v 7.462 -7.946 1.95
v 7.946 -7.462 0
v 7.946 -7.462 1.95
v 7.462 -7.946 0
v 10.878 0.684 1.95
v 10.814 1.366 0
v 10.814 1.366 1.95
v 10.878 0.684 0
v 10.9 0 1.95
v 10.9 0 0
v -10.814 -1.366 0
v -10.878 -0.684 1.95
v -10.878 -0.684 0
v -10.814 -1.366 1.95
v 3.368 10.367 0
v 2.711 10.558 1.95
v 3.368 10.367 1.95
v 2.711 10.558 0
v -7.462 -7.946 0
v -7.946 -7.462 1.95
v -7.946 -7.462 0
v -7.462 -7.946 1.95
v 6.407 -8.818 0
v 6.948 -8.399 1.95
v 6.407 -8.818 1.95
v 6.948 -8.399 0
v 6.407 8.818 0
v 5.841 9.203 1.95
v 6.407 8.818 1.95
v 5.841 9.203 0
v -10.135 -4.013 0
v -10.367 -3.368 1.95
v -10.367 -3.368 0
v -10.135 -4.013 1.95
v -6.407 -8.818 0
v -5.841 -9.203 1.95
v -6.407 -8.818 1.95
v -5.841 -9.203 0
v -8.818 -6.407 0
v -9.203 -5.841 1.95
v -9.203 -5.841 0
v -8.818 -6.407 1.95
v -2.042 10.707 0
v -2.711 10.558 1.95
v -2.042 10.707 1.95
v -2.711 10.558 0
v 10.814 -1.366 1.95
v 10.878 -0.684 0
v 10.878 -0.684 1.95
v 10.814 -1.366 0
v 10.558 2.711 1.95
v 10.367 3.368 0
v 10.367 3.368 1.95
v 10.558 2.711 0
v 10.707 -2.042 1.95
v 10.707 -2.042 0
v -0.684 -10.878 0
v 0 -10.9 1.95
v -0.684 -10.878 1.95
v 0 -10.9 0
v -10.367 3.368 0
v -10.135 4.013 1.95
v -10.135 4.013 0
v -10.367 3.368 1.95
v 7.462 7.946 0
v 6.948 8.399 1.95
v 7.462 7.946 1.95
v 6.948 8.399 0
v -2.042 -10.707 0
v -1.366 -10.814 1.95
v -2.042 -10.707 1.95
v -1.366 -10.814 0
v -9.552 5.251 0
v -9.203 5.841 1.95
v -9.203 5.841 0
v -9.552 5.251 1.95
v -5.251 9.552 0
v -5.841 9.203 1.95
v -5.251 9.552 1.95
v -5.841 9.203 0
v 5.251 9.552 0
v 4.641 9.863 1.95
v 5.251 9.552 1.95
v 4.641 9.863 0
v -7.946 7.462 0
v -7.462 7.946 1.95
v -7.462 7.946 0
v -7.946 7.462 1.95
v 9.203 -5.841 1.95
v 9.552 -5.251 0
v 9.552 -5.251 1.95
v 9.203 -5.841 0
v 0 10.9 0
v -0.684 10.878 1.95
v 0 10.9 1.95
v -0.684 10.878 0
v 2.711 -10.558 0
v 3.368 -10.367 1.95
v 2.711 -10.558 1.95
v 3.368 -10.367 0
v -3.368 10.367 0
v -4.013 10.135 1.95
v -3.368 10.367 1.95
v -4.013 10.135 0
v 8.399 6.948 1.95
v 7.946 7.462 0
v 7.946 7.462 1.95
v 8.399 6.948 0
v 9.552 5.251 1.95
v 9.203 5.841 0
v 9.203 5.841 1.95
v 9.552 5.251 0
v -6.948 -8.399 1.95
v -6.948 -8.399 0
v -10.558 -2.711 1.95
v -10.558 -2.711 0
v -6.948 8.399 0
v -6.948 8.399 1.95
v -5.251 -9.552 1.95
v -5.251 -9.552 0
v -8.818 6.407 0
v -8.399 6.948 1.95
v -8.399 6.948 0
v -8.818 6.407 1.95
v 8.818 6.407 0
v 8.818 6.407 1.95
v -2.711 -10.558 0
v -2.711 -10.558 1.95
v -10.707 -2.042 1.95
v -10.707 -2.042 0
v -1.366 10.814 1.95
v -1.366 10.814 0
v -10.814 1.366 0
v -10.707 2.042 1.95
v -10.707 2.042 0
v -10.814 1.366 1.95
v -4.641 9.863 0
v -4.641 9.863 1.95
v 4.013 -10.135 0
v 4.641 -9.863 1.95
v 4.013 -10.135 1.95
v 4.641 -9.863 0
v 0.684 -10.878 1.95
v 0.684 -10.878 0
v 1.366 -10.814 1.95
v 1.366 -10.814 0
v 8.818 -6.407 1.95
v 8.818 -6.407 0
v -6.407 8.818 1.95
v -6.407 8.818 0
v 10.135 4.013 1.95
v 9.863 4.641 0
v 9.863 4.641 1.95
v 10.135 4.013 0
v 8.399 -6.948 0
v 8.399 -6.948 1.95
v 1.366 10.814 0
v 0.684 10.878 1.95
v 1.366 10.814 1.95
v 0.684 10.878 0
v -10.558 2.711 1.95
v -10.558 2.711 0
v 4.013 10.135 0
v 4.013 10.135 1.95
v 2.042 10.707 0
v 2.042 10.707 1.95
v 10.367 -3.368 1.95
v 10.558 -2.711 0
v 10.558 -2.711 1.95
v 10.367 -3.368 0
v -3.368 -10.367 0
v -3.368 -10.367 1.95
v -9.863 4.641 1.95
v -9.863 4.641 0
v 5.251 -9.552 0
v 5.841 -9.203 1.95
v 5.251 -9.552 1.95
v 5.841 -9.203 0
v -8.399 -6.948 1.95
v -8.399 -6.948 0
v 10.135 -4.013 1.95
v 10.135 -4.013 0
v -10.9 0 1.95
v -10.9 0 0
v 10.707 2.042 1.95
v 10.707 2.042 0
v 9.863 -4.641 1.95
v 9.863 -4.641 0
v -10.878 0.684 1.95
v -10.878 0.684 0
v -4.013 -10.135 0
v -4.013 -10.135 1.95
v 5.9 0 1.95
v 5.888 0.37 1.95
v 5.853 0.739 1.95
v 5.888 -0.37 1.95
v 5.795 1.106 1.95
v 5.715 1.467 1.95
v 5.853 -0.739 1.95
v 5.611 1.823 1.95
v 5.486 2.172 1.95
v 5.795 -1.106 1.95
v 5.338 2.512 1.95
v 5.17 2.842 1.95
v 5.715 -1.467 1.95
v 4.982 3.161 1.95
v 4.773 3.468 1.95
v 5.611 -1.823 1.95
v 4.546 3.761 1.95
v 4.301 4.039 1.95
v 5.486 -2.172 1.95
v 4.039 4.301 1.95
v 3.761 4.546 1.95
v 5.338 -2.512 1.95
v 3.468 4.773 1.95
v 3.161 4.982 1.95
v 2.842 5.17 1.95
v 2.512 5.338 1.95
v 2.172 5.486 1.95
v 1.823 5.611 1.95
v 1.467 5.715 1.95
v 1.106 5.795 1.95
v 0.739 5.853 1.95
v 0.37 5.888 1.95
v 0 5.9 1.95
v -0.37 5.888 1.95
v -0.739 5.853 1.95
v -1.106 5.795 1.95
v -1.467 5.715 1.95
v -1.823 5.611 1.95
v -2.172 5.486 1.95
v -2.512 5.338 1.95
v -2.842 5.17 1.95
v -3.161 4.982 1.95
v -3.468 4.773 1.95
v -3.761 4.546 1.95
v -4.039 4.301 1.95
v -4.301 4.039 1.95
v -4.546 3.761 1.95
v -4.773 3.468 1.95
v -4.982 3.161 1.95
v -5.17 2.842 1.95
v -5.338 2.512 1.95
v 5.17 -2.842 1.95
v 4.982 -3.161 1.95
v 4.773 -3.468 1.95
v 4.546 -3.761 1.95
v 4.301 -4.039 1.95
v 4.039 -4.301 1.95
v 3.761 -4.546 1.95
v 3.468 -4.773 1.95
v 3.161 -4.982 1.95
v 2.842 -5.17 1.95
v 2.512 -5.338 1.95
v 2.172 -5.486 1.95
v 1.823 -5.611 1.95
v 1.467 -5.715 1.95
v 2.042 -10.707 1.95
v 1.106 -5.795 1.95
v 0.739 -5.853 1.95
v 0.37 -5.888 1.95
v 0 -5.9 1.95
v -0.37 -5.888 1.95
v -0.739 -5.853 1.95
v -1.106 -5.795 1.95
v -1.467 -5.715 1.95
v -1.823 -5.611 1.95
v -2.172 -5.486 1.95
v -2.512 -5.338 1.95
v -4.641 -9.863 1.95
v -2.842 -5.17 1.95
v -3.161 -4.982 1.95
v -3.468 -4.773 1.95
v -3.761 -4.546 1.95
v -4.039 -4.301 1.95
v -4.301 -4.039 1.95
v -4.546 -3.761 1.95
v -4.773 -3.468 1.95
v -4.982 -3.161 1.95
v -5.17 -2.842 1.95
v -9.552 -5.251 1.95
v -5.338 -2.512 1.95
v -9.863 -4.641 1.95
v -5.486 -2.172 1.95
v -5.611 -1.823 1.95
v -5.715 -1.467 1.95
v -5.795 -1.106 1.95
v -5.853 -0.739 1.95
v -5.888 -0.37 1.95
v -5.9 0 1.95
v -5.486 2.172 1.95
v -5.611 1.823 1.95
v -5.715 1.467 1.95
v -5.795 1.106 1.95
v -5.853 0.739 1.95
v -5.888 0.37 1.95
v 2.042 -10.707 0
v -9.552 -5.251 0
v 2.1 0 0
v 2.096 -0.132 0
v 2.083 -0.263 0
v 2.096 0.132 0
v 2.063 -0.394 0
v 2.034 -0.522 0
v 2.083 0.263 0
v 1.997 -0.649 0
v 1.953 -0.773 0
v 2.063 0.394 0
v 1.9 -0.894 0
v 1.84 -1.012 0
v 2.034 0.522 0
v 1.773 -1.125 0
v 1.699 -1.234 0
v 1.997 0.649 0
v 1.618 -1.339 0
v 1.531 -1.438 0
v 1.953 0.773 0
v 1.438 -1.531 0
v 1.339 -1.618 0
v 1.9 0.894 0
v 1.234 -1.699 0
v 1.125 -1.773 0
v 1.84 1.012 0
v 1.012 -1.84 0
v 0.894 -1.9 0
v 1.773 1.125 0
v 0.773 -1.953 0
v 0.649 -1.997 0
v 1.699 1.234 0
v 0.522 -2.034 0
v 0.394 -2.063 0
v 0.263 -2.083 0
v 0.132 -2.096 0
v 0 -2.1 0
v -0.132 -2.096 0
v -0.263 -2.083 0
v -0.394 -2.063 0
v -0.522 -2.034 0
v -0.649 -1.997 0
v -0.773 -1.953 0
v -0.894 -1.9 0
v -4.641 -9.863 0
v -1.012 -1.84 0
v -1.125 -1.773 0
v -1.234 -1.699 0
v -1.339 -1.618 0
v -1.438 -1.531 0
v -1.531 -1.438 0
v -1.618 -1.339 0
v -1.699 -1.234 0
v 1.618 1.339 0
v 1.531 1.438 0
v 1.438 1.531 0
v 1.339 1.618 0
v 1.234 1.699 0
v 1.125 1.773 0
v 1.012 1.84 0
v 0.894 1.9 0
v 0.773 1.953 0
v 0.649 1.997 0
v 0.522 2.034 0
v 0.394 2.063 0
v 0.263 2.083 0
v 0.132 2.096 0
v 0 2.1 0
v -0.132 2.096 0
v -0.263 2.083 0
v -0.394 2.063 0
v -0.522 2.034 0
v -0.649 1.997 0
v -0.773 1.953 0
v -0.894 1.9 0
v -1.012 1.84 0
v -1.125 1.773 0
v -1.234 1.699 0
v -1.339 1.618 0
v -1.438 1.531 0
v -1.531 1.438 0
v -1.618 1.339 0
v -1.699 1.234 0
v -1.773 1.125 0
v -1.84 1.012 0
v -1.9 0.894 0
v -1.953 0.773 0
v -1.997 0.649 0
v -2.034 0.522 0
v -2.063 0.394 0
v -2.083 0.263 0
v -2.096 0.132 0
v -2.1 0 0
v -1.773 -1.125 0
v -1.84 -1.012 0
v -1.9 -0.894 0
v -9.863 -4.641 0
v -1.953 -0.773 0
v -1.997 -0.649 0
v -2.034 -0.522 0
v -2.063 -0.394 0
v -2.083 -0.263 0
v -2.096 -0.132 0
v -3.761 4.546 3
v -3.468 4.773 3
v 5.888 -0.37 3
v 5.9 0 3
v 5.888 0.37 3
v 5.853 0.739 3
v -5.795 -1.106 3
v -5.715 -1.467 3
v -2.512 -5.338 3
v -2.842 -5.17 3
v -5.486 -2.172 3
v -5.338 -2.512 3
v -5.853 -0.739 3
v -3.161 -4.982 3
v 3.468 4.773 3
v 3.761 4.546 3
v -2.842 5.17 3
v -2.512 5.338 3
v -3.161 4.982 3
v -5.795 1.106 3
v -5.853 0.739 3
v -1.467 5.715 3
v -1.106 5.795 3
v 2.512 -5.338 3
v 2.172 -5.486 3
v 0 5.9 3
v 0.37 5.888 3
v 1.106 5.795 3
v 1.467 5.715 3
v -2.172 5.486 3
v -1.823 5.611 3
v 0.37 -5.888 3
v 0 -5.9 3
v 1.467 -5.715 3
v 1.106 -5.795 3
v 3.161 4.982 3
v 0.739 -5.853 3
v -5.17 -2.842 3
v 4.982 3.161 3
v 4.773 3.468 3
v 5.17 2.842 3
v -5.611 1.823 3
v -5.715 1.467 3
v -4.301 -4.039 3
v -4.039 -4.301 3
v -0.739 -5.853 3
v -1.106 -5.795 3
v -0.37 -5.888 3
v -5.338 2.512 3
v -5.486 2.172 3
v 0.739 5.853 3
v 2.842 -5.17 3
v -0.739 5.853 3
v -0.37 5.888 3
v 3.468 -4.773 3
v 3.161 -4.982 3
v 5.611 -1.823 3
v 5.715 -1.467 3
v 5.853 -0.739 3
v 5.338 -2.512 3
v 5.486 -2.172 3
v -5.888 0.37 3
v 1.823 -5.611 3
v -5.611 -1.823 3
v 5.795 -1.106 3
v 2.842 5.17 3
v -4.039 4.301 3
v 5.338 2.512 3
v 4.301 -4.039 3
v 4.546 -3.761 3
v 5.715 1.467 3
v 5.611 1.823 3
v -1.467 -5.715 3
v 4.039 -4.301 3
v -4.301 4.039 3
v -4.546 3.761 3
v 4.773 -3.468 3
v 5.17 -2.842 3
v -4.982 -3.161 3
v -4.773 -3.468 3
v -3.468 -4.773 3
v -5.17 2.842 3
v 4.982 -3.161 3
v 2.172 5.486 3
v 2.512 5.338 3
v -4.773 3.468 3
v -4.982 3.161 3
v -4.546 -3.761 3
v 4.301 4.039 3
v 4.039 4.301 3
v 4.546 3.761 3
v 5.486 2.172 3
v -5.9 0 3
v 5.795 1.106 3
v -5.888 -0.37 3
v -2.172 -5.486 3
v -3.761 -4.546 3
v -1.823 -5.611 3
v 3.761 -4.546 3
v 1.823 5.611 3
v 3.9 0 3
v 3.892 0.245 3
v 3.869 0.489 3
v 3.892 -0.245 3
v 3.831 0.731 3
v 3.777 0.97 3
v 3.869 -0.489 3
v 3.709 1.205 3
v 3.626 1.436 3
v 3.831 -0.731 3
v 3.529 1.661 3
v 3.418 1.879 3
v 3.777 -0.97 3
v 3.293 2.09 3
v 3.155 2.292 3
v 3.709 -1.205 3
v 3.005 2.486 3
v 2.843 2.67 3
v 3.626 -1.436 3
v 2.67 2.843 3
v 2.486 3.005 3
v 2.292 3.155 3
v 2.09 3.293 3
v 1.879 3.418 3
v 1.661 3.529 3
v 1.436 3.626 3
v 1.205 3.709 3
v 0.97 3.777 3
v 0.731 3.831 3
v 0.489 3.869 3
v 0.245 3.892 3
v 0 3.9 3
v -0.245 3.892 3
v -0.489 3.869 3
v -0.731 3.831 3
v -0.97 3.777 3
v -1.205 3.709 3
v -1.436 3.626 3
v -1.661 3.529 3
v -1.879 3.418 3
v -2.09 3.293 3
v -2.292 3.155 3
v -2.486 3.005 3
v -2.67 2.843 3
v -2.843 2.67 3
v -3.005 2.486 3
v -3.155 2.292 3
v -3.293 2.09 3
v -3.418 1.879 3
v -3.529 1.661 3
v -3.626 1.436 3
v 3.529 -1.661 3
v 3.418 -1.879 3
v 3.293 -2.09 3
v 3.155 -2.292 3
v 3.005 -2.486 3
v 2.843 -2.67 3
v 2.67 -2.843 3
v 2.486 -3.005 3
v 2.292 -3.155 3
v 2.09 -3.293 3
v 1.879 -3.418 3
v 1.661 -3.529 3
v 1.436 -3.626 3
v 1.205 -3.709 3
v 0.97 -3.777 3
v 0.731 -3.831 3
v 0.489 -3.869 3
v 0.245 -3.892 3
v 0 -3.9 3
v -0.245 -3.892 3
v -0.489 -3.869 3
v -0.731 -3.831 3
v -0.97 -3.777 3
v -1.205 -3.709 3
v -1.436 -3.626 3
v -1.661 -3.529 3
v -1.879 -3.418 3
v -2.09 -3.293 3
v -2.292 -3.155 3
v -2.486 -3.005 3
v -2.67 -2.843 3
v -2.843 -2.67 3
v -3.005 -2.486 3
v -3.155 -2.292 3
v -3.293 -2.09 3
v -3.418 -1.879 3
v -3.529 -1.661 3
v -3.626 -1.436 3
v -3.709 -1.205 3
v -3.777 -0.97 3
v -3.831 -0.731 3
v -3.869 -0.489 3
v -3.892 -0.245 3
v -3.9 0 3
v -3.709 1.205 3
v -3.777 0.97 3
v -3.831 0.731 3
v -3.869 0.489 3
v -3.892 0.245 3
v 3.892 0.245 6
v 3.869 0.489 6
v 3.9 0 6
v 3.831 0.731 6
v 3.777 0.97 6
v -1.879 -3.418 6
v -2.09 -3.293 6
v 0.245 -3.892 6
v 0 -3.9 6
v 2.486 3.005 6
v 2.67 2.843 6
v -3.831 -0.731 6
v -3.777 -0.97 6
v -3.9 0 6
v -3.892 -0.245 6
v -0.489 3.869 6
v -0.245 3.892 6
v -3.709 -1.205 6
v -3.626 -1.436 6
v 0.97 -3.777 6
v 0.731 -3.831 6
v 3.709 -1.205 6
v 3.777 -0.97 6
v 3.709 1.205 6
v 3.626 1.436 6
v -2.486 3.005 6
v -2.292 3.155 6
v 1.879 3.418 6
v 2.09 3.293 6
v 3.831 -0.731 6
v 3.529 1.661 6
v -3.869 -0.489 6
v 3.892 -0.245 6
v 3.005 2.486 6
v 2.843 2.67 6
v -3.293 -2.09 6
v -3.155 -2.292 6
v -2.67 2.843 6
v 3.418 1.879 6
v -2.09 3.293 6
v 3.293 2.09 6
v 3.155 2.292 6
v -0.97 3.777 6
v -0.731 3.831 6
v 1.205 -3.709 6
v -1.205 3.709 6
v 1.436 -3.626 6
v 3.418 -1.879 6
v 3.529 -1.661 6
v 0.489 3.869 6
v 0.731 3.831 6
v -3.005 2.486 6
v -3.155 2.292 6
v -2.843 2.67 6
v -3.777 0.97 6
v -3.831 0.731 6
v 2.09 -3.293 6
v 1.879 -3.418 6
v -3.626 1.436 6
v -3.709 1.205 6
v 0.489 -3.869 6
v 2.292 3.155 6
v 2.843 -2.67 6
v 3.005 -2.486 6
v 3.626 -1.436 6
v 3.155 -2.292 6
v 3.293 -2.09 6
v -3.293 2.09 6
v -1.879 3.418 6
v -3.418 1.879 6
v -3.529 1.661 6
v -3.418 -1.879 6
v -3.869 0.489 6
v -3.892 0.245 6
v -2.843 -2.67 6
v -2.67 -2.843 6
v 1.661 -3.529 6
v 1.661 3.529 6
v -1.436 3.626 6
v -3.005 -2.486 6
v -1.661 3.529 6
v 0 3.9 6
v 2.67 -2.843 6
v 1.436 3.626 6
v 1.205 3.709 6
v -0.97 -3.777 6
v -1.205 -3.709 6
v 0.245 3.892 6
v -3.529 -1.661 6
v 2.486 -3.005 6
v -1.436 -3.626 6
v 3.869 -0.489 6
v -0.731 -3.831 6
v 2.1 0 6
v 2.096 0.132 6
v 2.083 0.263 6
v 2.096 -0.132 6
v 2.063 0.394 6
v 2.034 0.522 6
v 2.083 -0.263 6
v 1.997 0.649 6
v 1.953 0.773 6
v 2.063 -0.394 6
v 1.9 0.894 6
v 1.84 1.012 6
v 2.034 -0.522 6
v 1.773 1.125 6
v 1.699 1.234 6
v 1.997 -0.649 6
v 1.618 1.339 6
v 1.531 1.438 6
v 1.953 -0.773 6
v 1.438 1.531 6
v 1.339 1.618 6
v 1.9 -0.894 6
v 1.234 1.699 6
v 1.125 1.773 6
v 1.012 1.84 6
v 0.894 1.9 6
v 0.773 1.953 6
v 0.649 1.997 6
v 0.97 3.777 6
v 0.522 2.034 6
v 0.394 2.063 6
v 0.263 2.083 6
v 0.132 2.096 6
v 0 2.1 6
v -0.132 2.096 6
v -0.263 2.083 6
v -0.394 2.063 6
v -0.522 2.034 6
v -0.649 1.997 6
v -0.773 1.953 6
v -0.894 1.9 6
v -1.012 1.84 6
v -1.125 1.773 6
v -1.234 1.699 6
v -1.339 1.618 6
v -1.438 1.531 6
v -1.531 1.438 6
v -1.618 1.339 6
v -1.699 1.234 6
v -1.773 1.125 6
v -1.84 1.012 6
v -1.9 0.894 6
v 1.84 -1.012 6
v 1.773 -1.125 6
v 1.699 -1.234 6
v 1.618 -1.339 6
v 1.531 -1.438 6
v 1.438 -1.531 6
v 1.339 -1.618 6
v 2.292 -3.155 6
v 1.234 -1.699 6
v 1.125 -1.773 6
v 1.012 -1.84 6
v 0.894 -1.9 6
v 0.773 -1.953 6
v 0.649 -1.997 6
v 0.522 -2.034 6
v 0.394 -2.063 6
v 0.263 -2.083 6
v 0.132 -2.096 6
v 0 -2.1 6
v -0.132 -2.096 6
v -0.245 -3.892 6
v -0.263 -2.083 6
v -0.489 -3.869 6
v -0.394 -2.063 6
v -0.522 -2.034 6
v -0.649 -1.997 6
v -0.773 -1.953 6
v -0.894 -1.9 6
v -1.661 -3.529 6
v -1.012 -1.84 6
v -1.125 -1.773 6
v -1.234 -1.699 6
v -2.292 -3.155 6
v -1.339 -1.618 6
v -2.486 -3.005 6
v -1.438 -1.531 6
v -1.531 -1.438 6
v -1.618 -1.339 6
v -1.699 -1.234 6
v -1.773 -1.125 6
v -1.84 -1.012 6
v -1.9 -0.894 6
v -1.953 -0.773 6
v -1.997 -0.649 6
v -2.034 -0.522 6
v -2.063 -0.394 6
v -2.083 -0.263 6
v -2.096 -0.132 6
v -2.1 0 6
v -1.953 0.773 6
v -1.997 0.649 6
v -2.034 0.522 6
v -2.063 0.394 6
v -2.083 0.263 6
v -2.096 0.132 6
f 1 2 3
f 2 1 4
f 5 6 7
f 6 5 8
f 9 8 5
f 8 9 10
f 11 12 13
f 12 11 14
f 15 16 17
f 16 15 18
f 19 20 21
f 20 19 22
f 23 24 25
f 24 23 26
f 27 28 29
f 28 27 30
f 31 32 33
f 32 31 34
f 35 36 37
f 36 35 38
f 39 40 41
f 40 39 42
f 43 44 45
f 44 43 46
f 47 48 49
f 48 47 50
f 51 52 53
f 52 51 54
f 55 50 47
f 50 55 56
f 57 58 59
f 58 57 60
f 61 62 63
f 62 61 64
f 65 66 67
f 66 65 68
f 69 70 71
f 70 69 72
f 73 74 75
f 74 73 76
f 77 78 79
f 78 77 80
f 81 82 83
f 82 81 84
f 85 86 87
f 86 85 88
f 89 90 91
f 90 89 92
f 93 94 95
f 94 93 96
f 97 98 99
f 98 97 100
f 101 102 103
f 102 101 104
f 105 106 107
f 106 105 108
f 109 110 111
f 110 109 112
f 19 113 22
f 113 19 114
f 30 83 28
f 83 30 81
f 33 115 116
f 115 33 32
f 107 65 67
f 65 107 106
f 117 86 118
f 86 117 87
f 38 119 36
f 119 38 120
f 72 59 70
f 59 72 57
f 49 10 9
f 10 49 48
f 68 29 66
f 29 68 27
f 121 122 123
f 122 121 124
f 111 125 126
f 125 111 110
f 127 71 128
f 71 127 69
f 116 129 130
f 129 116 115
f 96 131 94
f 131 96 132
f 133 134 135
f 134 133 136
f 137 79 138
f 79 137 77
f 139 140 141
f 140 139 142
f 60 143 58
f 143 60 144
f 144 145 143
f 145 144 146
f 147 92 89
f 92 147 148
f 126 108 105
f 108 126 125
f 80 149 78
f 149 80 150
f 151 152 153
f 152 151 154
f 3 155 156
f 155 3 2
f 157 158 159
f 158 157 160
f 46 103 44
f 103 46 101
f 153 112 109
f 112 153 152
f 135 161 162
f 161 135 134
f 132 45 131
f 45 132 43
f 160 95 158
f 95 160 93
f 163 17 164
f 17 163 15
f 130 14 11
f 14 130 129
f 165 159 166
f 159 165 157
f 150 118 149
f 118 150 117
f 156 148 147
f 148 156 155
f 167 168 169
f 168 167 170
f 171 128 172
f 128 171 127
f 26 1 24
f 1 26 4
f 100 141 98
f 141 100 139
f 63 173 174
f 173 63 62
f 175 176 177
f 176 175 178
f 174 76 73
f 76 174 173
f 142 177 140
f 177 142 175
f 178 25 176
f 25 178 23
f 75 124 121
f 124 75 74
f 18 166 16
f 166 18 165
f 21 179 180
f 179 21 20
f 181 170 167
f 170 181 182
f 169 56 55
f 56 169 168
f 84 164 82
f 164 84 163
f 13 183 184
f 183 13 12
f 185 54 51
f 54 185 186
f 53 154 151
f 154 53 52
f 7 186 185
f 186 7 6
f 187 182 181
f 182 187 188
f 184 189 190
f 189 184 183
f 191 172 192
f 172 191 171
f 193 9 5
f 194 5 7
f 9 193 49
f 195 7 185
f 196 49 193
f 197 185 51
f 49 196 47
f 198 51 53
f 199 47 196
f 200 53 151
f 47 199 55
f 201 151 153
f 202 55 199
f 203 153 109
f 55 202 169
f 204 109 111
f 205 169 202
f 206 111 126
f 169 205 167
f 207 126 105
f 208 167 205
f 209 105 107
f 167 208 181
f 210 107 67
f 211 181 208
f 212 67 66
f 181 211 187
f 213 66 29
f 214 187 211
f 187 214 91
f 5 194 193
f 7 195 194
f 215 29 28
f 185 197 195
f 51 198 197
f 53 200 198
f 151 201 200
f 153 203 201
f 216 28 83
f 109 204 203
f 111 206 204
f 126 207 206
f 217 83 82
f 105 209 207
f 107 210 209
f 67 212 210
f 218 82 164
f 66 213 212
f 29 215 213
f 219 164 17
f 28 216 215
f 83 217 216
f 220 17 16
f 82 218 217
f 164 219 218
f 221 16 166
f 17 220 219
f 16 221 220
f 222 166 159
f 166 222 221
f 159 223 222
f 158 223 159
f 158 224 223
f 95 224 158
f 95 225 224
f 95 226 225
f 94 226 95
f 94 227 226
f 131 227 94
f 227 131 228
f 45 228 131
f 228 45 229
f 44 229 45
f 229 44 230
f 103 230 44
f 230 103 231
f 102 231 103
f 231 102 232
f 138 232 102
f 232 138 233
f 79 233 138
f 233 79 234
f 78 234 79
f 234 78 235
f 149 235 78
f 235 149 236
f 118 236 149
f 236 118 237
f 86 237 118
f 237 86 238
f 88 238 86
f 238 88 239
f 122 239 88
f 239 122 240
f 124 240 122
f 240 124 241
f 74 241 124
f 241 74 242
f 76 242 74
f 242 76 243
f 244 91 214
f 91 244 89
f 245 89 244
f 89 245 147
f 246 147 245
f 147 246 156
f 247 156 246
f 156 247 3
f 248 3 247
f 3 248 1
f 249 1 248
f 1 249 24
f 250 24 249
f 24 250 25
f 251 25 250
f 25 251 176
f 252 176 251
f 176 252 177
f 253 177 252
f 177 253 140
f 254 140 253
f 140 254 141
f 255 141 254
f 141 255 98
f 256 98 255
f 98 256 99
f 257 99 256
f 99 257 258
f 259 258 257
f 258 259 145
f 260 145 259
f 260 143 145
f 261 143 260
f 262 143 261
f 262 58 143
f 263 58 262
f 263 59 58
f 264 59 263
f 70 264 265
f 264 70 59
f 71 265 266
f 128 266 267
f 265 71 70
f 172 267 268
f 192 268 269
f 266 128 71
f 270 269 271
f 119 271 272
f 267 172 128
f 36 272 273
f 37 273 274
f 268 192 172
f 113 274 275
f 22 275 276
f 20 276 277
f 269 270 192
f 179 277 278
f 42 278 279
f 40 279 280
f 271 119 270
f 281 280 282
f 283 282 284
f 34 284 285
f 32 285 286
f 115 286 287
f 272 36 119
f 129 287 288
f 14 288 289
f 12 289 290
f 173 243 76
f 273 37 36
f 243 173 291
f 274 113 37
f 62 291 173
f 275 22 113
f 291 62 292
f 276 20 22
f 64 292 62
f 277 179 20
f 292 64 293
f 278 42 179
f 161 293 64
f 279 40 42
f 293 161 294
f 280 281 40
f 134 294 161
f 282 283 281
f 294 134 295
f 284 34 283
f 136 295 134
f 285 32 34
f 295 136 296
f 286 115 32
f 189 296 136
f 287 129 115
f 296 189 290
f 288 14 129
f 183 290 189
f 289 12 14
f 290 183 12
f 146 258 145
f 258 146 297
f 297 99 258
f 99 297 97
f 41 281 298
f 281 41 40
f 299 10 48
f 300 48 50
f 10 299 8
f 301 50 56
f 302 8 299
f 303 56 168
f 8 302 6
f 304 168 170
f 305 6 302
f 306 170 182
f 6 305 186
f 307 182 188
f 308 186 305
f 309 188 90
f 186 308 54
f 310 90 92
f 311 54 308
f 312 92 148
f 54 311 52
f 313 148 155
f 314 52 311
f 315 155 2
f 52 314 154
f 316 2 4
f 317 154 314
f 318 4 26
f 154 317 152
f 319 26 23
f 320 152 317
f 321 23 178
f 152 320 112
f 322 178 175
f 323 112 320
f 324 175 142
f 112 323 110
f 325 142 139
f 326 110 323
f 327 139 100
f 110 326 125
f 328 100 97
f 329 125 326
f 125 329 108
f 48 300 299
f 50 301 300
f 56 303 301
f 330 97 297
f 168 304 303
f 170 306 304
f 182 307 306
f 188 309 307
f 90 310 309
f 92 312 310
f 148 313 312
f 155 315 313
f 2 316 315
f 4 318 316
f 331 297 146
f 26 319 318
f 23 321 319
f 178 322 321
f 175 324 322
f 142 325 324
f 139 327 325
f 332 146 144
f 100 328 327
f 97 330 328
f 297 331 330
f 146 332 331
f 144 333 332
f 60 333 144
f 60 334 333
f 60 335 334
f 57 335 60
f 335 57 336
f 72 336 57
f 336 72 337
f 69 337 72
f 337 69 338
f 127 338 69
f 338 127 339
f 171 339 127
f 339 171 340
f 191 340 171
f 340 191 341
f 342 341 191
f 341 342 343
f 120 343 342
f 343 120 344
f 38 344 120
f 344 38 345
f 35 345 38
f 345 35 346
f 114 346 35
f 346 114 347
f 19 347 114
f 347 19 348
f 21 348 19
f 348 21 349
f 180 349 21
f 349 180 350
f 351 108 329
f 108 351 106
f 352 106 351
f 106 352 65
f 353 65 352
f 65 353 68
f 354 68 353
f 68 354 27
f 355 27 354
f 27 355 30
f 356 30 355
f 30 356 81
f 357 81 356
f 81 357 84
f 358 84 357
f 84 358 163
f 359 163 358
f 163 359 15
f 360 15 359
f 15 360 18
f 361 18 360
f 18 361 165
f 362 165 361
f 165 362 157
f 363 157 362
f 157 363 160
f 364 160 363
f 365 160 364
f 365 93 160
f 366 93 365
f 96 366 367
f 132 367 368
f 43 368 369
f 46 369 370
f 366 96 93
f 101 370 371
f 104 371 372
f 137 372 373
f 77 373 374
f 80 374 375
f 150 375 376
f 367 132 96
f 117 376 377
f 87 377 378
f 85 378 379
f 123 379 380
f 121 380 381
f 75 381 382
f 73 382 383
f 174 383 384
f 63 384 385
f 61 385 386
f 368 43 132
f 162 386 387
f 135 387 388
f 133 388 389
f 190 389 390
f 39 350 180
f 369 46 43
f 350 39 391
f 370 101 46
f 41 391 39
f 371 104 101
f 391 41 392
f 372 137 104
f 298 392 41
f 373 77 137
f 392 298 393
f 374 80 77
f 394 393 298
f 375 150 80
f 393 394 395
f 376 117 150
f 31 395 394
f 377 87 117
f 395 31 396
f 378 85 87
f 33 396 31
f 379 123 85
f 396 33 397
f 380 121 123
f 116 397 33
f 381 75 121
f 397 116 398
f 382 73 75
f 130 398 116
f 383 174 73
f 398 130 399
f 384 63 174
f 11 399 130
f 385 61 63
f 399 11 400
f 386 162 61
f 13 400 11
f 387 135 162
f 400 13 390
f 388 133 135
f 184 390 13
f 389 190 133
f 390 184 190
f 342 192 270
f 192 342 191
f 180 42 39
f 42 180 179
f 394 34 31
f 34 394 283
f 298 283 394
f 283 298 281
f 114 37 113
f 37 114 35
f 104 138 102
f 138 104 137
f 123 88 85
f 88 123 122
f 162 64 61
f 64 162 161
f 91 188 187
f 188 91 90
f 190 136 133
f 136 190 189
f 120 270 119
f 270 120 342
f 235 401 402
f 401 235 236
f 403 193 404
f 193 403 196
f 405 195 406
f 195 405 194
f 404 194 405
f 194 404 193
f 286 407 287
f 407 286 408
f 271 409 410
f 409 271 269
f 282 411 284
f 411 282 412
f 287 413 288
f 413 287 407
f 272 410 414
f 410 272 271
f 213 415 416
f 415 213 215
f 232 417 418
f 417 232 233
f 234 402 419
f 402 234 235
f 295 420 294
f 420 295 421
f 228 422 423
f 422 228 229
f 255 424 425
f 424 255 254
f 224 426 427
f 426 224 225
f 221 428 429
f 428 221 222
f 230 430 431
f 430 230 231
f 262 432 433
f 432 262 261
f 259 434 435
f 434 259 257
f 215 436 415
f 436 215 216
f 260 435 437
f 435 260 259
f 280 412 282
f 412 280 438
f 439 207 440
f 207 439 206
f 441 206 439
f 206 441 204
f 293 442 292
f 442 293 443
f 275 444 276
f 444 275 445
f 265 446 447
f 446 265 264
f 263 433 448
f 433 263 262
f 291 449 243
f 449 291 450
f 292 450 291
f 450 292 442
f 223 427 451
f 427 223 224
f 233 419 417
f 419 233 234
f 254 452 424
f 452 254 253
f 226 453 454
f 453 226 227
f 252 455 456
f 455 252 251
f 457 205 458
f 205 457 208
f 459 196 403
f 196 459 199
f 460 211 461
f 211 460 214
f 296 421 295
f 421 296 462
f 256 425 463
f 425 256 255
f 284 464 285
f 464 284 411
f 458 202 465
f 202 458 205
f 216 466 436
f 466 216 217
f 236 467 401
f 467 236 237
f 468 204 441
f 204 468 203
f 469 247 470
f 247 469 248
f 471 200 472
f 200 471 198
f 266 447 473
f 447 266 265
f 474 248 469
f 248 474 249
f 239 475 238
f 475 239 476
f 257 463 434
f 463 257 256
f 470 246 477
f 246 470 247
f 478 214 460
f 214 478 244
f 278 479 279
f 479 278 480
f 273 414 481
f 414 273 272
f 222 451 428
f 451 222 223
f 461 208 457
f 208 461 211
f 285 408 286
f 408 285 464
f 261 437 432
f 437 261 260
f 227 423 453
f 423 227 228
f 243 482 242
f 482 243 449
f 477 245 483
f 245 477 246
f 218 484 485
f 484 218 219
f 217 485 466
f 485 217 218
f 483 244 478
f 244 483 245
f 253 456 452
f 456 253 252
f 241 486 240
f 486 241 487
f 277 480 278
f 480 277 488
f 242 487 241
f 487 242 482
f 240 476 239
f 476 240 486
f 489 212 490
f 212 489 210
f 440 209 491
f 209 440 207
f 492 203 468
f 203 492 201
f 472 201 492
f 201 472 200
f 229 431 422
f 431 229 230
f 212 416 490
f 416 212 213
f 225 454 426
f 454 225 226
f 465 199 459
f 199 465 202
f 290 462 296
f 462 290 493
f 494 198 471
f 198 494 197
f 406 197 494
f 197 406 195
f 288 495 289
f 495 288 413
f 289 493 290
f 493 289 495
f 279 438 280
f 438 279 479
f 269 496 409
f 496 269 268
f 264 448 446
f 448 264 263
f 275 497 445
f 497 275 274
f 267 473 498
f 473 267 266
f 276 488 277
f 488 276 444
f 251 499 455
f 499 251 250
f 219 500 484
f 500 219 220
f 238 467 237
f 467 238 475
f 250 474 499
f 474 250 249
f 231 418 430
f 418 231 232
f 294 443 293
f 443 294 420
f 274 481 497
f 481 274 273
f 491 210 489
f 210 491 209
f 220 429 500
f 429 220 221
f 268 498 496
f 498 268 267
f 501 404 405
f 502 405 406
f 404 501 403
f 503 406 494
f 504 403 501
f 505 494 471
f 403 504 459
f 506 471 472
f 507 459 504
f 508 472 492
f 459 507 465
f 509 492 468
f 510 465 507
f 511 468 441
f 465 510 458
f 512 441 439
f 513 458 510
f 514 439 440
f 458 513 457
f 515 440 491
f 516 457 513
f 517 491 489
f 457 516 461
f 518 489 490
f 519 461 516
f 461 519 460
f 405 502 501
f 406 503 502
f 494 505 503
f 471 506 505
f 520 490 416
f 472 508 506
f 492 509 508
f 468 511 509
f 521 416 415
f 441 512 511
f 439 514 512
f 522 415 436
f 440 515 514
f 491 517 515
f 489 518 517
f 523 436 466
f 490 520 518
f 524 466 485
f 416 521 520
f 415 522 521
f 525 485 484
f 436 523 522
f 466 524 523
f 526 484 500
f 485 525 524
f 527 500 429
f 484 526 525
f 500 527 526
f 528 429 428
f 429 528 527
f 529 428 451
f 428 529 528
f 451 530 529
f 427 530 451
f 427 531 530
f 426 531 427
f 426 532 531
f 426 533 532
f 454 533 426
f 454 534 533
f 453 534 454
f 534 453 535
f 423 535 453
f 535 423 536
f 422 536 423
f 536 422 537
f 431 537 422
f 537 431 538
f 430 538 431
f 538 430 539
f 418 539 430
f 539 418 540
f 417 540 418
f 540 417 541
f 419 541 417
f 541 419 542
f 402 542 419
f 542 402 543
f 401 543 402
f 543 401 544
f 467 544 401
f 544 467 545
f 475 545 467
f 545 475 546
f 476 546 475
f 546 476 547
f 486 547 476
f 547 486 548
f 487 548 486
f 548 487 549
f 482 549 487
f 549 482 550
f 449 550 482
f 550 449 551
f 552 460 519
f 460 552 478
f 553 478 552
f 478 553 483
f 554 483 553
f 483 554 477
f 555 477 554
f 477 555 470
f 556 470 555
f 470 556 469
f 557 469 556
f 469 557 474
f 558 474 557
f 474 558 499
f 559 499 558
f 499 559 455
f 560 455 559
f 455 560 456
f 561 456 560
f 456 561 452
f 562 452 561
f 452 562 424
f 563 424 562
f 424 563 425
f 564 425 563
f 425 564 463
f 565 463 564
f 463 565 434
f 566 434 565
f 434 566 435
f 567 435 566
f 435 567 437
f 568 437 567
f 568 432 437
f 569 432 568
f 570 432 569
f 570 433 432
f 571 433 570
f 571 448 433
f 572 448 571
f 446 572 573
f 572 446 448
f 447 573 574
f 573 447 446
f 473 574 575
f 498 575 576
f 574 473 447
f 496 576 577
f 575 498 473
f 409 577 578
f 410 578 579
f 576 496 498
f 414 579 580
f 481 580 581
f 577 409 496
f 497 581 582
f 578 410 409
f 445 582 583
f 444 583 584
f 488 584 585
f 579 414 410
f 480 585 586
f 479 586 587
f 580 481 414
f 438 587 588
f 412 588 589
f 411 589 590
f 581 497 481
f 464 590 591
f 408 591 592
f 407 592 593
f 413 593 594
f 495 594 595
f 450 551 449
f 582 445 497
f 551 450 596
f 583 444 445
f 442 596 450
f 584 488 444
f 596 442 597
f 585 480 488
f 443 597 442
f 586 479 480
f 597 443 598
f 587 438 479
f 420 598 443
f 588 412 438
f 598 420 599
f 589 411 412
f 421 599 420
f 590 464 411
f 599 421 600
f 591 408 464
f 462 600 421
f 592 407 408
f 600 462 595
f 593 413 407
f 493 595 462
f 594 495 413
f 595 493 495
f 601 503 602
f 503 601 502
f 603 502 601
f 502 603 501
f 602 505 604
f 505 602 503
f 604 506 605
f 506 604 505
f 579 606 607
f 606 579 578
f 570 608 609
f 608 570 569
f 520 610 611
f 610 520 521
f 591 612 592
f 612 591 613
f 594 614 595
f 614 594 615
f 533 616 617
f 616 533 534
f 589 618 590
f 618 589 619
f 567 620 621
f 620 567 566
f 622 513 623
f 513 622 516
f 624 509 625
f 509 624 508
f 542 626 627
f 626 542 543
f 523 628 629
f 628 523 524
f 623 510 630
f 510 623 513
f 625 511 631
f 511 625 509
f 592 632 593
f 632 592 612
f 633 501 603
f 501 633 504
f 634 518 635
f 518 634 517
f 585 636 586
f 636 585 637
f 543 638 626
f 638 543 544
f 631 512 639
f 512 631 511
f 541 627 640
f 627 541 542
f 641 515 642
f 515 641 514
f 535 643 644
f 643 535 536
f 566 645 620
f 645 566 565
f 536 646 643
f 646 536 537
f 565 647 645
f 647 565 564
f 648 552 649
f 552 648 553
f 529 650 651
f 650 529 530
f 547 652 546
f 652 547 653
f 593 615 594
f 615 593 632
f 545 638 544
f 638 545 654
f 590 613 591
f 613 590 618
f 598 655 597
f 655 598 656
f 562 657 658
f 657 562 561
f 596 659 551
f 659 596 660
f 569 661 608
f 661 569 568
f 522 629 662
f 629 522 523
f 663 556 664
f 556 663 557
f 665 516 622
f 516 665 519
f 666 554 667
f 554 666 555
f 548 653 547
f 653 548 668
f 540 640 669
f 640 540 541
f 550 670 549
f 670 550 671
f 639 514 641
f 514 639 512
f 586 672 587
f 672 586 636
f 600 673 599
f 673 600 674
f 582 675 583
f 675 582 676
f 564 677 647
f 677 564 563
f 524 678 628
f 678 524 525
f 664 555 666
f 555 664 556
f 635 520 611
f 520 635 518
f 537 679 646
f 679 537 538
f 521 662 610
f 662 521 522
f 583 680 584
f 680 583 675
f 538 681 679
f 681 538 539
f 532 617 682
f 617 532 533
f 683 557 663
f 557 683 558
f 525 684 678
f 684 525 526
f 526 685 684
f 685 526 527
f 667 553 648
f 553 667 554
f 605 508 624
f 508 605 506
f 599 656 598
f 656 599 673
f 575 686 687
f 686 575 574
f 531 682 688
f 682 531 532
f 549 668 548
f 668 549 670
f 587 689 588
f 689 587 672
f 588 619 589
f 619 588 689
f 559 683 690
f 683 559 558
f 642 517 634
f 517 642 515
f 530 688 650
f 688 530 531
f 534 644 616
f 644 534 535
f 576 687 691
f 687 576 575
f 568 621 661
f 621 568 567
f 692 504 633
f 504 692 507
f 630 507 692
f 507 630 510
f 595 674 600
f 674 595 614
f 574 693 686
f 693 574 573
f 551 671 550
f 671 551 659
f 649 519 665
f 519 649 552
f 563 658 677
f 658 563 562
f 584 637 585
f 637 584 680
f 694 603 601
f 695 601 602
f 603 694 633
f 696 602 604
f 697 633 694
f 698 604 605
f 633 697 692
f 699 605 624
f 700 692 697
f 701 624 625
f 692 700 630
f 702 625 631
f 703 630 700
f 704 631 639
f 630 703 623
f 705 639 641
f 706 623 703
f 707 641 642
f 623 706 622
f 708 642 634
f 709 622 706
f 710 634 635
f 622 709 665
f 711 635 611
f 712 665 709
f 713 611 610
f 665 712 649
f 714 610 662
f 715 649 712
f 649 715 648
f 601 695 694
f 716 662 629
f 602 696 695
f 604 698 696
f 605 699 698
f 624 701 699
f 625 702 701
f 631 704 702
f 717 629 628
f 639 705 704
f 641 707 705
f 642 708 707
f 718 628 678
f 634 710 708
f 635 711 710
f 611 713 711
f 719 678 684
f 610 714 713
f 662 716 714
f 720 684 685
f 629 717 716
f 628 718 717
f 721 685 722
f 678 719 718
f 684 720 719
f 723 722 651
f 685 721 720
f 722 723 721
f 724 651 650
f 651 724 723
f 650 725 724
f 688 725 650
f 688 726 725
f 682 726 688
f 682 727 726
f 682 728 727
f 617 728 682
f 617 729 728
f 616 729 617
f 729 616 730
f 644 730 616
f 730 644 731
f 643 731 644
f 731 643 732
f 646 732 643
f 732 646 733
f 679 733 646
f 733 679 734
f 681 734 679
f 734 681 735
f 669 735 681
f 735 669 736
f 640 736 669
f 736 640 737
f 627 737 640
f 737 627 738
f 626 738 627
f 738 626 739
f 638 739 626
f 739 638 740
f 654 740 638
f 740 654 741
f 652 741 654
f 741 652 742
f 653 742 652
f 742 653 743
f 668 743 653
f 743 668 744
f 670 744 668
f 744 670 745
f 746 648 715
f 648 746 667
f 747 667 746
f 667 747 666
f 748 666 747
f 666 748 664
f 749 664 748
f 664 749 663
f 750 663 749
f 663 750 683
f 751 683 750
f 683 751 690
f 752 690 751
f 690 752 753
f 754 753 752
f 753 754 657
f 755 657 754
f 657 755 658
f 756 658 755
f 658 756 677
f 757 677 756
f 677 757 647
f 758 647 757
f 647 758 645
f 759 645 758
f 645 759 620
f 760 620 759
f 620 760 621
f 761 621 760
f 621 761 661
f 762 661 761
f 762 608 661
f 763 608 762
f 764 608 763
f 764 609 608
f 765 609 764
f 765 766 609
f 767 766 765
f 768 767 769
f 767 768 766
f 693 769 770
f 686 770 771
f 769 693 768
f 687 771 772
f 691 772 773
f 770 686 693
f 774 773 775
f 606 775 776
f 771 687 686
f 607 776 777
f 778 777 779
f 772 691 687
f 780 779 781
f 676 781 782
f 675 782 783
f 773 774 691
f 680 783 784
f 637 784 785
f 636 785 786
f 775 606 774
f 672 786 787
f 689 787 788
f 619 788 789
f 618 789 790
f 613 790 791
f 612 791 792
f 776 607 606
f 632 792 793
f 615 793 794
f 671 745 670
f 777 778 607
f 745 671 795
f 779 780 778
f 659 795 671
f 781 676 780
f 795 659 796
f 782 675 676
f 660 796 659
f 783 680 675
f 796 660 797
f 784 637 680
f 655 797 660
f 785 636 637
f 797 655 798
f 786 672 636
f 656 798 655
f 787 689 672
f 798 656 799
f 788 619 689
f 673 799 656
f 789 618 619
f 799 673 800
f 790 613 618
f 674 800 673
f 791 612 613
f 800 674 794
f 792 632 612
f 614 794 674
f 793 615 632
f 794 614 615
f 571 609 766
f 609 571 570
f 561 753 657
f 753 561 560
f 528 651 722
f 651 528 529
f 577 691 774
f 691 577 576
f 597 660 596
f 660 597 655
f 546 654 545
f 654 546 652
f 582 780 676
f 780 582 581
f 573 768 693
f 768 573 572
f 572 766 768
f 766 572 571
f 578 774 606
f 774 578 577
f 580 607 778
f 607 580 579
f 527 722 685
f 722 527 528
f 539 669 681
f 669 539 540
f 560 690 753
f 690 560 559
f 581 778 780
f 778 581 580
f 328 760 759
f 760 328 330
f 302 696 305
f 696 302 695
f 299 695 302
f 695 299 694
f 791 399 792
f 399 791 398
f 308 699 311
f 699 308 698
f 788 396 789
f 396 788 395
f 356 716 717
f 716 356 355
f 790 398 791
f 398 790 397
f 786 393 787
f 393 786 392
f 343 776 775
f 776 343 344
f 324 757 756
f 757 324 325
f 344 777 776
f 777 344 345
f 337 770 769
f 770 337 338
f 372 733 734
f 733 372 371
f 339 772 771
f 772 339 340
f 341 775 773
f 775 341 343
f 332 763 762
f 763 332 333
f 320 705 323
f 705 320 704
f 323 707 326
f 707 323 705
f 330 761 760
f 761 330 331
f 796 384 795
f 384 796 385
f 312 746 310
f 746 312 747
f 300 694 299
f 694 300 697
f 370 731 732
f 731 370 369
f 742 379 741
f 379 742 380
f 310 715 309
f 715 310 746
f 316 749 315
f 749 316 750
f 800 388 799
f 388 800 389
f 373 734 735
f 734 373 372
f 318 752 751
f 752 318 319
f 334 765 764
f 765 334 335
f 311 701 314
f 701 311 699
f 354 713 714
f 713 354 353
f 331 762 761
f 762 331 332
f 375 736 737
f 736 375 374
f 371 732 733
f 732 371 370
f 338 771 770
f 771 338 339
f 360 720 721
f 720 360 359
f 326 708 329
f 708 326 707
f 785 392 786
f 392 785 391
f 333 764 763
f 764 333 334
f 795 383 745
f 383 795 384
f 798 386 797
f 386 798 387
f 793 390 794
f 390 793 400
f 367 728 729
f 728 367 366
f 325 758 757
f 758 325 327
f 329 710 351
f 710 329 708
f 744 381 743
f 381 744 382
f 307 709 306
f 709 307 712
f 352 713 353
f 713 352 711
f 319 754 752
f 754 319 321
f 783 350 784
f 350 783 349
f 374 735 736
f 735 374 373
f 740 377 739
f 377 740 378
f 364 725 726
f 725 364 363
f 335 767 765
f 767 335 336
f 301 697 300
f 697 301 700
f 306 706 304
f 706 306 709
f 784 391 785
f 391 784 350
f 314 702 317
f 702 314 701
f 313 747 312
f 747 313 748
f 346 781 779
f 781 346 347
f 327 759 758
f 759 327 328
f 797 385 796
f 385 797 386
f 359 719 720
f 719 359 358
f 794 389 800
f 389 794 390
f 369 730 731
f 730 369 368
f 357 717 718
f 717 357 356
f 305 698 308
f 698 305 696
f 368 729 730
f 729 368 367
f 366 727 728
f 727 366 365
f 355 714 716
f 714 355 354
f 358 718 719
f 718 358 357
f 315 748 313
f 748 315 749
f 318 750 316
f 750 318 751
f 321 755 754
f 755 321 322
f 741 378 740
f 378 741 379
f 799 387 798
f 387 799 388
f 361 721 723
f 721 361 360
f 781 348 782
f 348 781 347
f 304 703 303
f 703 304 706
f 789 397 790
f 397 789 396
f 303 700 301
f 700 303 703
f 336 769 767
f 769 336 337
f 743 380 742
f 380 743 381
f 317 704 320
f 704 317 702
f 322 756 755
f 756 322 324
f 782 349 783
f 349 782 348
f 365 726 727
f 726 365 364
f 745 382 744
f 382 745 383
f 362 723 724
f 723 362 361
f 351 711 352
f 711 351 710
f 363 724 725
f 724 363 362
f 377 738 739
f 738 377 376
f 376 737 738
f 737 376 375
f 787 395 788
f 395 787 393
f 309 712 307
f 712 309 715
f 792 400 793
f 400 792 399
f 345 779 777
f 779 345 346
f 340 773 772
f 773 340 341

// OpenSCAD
/* [Spacer] */

//spacer outer diameter
outer_diameter=22;

//spacer inner diameter
inner_diameter=8;

//spacer width (including profil shift)
spacer_width=3;

//profil shift width(in % of spacer width)
profil_shift_width=0.35;//[0:0.05:1]

//profil shift thickness
profil_shift_thickness=2;


/* [Optional Screw Lead] */
//Set option
option=1; //[1:yes,-1:no]

//bearing width
bearing_width=7;

//screw diameter
screw_diameter=4;

/* [Fine Tunning] */
//tolerance (XY compensation)
tolerance=0.1;

//definition
definition=100;//[50:low,100:medium,150:high]


/////////////////////
$fn=definition;

module spacer() {
difference() {
union() {
cylinder(d=outer_diameter-2*tolerance,h=spacer_width*(1 - profil_shift_width));
cylinder(d=inner_diameter + 2*profil_shift_thickness - 2*tolerance, h=spacer_width);
cylinder(d=inner_diameter - 2*tolerance, h=spacer_width + bearing_width/2 - 0.5);
}

if(option==1){
translate([0,0,-1]) cylinder(d=screw_diameter + 2*tolerance, h=spacer_width + bearing_width +2);
}
else {
translate([0,0,-1]) cylinder(d=inner_diameter + 2*tolerance, h=spacer_width + bearing_width +2);
}
}
}



spacer();
